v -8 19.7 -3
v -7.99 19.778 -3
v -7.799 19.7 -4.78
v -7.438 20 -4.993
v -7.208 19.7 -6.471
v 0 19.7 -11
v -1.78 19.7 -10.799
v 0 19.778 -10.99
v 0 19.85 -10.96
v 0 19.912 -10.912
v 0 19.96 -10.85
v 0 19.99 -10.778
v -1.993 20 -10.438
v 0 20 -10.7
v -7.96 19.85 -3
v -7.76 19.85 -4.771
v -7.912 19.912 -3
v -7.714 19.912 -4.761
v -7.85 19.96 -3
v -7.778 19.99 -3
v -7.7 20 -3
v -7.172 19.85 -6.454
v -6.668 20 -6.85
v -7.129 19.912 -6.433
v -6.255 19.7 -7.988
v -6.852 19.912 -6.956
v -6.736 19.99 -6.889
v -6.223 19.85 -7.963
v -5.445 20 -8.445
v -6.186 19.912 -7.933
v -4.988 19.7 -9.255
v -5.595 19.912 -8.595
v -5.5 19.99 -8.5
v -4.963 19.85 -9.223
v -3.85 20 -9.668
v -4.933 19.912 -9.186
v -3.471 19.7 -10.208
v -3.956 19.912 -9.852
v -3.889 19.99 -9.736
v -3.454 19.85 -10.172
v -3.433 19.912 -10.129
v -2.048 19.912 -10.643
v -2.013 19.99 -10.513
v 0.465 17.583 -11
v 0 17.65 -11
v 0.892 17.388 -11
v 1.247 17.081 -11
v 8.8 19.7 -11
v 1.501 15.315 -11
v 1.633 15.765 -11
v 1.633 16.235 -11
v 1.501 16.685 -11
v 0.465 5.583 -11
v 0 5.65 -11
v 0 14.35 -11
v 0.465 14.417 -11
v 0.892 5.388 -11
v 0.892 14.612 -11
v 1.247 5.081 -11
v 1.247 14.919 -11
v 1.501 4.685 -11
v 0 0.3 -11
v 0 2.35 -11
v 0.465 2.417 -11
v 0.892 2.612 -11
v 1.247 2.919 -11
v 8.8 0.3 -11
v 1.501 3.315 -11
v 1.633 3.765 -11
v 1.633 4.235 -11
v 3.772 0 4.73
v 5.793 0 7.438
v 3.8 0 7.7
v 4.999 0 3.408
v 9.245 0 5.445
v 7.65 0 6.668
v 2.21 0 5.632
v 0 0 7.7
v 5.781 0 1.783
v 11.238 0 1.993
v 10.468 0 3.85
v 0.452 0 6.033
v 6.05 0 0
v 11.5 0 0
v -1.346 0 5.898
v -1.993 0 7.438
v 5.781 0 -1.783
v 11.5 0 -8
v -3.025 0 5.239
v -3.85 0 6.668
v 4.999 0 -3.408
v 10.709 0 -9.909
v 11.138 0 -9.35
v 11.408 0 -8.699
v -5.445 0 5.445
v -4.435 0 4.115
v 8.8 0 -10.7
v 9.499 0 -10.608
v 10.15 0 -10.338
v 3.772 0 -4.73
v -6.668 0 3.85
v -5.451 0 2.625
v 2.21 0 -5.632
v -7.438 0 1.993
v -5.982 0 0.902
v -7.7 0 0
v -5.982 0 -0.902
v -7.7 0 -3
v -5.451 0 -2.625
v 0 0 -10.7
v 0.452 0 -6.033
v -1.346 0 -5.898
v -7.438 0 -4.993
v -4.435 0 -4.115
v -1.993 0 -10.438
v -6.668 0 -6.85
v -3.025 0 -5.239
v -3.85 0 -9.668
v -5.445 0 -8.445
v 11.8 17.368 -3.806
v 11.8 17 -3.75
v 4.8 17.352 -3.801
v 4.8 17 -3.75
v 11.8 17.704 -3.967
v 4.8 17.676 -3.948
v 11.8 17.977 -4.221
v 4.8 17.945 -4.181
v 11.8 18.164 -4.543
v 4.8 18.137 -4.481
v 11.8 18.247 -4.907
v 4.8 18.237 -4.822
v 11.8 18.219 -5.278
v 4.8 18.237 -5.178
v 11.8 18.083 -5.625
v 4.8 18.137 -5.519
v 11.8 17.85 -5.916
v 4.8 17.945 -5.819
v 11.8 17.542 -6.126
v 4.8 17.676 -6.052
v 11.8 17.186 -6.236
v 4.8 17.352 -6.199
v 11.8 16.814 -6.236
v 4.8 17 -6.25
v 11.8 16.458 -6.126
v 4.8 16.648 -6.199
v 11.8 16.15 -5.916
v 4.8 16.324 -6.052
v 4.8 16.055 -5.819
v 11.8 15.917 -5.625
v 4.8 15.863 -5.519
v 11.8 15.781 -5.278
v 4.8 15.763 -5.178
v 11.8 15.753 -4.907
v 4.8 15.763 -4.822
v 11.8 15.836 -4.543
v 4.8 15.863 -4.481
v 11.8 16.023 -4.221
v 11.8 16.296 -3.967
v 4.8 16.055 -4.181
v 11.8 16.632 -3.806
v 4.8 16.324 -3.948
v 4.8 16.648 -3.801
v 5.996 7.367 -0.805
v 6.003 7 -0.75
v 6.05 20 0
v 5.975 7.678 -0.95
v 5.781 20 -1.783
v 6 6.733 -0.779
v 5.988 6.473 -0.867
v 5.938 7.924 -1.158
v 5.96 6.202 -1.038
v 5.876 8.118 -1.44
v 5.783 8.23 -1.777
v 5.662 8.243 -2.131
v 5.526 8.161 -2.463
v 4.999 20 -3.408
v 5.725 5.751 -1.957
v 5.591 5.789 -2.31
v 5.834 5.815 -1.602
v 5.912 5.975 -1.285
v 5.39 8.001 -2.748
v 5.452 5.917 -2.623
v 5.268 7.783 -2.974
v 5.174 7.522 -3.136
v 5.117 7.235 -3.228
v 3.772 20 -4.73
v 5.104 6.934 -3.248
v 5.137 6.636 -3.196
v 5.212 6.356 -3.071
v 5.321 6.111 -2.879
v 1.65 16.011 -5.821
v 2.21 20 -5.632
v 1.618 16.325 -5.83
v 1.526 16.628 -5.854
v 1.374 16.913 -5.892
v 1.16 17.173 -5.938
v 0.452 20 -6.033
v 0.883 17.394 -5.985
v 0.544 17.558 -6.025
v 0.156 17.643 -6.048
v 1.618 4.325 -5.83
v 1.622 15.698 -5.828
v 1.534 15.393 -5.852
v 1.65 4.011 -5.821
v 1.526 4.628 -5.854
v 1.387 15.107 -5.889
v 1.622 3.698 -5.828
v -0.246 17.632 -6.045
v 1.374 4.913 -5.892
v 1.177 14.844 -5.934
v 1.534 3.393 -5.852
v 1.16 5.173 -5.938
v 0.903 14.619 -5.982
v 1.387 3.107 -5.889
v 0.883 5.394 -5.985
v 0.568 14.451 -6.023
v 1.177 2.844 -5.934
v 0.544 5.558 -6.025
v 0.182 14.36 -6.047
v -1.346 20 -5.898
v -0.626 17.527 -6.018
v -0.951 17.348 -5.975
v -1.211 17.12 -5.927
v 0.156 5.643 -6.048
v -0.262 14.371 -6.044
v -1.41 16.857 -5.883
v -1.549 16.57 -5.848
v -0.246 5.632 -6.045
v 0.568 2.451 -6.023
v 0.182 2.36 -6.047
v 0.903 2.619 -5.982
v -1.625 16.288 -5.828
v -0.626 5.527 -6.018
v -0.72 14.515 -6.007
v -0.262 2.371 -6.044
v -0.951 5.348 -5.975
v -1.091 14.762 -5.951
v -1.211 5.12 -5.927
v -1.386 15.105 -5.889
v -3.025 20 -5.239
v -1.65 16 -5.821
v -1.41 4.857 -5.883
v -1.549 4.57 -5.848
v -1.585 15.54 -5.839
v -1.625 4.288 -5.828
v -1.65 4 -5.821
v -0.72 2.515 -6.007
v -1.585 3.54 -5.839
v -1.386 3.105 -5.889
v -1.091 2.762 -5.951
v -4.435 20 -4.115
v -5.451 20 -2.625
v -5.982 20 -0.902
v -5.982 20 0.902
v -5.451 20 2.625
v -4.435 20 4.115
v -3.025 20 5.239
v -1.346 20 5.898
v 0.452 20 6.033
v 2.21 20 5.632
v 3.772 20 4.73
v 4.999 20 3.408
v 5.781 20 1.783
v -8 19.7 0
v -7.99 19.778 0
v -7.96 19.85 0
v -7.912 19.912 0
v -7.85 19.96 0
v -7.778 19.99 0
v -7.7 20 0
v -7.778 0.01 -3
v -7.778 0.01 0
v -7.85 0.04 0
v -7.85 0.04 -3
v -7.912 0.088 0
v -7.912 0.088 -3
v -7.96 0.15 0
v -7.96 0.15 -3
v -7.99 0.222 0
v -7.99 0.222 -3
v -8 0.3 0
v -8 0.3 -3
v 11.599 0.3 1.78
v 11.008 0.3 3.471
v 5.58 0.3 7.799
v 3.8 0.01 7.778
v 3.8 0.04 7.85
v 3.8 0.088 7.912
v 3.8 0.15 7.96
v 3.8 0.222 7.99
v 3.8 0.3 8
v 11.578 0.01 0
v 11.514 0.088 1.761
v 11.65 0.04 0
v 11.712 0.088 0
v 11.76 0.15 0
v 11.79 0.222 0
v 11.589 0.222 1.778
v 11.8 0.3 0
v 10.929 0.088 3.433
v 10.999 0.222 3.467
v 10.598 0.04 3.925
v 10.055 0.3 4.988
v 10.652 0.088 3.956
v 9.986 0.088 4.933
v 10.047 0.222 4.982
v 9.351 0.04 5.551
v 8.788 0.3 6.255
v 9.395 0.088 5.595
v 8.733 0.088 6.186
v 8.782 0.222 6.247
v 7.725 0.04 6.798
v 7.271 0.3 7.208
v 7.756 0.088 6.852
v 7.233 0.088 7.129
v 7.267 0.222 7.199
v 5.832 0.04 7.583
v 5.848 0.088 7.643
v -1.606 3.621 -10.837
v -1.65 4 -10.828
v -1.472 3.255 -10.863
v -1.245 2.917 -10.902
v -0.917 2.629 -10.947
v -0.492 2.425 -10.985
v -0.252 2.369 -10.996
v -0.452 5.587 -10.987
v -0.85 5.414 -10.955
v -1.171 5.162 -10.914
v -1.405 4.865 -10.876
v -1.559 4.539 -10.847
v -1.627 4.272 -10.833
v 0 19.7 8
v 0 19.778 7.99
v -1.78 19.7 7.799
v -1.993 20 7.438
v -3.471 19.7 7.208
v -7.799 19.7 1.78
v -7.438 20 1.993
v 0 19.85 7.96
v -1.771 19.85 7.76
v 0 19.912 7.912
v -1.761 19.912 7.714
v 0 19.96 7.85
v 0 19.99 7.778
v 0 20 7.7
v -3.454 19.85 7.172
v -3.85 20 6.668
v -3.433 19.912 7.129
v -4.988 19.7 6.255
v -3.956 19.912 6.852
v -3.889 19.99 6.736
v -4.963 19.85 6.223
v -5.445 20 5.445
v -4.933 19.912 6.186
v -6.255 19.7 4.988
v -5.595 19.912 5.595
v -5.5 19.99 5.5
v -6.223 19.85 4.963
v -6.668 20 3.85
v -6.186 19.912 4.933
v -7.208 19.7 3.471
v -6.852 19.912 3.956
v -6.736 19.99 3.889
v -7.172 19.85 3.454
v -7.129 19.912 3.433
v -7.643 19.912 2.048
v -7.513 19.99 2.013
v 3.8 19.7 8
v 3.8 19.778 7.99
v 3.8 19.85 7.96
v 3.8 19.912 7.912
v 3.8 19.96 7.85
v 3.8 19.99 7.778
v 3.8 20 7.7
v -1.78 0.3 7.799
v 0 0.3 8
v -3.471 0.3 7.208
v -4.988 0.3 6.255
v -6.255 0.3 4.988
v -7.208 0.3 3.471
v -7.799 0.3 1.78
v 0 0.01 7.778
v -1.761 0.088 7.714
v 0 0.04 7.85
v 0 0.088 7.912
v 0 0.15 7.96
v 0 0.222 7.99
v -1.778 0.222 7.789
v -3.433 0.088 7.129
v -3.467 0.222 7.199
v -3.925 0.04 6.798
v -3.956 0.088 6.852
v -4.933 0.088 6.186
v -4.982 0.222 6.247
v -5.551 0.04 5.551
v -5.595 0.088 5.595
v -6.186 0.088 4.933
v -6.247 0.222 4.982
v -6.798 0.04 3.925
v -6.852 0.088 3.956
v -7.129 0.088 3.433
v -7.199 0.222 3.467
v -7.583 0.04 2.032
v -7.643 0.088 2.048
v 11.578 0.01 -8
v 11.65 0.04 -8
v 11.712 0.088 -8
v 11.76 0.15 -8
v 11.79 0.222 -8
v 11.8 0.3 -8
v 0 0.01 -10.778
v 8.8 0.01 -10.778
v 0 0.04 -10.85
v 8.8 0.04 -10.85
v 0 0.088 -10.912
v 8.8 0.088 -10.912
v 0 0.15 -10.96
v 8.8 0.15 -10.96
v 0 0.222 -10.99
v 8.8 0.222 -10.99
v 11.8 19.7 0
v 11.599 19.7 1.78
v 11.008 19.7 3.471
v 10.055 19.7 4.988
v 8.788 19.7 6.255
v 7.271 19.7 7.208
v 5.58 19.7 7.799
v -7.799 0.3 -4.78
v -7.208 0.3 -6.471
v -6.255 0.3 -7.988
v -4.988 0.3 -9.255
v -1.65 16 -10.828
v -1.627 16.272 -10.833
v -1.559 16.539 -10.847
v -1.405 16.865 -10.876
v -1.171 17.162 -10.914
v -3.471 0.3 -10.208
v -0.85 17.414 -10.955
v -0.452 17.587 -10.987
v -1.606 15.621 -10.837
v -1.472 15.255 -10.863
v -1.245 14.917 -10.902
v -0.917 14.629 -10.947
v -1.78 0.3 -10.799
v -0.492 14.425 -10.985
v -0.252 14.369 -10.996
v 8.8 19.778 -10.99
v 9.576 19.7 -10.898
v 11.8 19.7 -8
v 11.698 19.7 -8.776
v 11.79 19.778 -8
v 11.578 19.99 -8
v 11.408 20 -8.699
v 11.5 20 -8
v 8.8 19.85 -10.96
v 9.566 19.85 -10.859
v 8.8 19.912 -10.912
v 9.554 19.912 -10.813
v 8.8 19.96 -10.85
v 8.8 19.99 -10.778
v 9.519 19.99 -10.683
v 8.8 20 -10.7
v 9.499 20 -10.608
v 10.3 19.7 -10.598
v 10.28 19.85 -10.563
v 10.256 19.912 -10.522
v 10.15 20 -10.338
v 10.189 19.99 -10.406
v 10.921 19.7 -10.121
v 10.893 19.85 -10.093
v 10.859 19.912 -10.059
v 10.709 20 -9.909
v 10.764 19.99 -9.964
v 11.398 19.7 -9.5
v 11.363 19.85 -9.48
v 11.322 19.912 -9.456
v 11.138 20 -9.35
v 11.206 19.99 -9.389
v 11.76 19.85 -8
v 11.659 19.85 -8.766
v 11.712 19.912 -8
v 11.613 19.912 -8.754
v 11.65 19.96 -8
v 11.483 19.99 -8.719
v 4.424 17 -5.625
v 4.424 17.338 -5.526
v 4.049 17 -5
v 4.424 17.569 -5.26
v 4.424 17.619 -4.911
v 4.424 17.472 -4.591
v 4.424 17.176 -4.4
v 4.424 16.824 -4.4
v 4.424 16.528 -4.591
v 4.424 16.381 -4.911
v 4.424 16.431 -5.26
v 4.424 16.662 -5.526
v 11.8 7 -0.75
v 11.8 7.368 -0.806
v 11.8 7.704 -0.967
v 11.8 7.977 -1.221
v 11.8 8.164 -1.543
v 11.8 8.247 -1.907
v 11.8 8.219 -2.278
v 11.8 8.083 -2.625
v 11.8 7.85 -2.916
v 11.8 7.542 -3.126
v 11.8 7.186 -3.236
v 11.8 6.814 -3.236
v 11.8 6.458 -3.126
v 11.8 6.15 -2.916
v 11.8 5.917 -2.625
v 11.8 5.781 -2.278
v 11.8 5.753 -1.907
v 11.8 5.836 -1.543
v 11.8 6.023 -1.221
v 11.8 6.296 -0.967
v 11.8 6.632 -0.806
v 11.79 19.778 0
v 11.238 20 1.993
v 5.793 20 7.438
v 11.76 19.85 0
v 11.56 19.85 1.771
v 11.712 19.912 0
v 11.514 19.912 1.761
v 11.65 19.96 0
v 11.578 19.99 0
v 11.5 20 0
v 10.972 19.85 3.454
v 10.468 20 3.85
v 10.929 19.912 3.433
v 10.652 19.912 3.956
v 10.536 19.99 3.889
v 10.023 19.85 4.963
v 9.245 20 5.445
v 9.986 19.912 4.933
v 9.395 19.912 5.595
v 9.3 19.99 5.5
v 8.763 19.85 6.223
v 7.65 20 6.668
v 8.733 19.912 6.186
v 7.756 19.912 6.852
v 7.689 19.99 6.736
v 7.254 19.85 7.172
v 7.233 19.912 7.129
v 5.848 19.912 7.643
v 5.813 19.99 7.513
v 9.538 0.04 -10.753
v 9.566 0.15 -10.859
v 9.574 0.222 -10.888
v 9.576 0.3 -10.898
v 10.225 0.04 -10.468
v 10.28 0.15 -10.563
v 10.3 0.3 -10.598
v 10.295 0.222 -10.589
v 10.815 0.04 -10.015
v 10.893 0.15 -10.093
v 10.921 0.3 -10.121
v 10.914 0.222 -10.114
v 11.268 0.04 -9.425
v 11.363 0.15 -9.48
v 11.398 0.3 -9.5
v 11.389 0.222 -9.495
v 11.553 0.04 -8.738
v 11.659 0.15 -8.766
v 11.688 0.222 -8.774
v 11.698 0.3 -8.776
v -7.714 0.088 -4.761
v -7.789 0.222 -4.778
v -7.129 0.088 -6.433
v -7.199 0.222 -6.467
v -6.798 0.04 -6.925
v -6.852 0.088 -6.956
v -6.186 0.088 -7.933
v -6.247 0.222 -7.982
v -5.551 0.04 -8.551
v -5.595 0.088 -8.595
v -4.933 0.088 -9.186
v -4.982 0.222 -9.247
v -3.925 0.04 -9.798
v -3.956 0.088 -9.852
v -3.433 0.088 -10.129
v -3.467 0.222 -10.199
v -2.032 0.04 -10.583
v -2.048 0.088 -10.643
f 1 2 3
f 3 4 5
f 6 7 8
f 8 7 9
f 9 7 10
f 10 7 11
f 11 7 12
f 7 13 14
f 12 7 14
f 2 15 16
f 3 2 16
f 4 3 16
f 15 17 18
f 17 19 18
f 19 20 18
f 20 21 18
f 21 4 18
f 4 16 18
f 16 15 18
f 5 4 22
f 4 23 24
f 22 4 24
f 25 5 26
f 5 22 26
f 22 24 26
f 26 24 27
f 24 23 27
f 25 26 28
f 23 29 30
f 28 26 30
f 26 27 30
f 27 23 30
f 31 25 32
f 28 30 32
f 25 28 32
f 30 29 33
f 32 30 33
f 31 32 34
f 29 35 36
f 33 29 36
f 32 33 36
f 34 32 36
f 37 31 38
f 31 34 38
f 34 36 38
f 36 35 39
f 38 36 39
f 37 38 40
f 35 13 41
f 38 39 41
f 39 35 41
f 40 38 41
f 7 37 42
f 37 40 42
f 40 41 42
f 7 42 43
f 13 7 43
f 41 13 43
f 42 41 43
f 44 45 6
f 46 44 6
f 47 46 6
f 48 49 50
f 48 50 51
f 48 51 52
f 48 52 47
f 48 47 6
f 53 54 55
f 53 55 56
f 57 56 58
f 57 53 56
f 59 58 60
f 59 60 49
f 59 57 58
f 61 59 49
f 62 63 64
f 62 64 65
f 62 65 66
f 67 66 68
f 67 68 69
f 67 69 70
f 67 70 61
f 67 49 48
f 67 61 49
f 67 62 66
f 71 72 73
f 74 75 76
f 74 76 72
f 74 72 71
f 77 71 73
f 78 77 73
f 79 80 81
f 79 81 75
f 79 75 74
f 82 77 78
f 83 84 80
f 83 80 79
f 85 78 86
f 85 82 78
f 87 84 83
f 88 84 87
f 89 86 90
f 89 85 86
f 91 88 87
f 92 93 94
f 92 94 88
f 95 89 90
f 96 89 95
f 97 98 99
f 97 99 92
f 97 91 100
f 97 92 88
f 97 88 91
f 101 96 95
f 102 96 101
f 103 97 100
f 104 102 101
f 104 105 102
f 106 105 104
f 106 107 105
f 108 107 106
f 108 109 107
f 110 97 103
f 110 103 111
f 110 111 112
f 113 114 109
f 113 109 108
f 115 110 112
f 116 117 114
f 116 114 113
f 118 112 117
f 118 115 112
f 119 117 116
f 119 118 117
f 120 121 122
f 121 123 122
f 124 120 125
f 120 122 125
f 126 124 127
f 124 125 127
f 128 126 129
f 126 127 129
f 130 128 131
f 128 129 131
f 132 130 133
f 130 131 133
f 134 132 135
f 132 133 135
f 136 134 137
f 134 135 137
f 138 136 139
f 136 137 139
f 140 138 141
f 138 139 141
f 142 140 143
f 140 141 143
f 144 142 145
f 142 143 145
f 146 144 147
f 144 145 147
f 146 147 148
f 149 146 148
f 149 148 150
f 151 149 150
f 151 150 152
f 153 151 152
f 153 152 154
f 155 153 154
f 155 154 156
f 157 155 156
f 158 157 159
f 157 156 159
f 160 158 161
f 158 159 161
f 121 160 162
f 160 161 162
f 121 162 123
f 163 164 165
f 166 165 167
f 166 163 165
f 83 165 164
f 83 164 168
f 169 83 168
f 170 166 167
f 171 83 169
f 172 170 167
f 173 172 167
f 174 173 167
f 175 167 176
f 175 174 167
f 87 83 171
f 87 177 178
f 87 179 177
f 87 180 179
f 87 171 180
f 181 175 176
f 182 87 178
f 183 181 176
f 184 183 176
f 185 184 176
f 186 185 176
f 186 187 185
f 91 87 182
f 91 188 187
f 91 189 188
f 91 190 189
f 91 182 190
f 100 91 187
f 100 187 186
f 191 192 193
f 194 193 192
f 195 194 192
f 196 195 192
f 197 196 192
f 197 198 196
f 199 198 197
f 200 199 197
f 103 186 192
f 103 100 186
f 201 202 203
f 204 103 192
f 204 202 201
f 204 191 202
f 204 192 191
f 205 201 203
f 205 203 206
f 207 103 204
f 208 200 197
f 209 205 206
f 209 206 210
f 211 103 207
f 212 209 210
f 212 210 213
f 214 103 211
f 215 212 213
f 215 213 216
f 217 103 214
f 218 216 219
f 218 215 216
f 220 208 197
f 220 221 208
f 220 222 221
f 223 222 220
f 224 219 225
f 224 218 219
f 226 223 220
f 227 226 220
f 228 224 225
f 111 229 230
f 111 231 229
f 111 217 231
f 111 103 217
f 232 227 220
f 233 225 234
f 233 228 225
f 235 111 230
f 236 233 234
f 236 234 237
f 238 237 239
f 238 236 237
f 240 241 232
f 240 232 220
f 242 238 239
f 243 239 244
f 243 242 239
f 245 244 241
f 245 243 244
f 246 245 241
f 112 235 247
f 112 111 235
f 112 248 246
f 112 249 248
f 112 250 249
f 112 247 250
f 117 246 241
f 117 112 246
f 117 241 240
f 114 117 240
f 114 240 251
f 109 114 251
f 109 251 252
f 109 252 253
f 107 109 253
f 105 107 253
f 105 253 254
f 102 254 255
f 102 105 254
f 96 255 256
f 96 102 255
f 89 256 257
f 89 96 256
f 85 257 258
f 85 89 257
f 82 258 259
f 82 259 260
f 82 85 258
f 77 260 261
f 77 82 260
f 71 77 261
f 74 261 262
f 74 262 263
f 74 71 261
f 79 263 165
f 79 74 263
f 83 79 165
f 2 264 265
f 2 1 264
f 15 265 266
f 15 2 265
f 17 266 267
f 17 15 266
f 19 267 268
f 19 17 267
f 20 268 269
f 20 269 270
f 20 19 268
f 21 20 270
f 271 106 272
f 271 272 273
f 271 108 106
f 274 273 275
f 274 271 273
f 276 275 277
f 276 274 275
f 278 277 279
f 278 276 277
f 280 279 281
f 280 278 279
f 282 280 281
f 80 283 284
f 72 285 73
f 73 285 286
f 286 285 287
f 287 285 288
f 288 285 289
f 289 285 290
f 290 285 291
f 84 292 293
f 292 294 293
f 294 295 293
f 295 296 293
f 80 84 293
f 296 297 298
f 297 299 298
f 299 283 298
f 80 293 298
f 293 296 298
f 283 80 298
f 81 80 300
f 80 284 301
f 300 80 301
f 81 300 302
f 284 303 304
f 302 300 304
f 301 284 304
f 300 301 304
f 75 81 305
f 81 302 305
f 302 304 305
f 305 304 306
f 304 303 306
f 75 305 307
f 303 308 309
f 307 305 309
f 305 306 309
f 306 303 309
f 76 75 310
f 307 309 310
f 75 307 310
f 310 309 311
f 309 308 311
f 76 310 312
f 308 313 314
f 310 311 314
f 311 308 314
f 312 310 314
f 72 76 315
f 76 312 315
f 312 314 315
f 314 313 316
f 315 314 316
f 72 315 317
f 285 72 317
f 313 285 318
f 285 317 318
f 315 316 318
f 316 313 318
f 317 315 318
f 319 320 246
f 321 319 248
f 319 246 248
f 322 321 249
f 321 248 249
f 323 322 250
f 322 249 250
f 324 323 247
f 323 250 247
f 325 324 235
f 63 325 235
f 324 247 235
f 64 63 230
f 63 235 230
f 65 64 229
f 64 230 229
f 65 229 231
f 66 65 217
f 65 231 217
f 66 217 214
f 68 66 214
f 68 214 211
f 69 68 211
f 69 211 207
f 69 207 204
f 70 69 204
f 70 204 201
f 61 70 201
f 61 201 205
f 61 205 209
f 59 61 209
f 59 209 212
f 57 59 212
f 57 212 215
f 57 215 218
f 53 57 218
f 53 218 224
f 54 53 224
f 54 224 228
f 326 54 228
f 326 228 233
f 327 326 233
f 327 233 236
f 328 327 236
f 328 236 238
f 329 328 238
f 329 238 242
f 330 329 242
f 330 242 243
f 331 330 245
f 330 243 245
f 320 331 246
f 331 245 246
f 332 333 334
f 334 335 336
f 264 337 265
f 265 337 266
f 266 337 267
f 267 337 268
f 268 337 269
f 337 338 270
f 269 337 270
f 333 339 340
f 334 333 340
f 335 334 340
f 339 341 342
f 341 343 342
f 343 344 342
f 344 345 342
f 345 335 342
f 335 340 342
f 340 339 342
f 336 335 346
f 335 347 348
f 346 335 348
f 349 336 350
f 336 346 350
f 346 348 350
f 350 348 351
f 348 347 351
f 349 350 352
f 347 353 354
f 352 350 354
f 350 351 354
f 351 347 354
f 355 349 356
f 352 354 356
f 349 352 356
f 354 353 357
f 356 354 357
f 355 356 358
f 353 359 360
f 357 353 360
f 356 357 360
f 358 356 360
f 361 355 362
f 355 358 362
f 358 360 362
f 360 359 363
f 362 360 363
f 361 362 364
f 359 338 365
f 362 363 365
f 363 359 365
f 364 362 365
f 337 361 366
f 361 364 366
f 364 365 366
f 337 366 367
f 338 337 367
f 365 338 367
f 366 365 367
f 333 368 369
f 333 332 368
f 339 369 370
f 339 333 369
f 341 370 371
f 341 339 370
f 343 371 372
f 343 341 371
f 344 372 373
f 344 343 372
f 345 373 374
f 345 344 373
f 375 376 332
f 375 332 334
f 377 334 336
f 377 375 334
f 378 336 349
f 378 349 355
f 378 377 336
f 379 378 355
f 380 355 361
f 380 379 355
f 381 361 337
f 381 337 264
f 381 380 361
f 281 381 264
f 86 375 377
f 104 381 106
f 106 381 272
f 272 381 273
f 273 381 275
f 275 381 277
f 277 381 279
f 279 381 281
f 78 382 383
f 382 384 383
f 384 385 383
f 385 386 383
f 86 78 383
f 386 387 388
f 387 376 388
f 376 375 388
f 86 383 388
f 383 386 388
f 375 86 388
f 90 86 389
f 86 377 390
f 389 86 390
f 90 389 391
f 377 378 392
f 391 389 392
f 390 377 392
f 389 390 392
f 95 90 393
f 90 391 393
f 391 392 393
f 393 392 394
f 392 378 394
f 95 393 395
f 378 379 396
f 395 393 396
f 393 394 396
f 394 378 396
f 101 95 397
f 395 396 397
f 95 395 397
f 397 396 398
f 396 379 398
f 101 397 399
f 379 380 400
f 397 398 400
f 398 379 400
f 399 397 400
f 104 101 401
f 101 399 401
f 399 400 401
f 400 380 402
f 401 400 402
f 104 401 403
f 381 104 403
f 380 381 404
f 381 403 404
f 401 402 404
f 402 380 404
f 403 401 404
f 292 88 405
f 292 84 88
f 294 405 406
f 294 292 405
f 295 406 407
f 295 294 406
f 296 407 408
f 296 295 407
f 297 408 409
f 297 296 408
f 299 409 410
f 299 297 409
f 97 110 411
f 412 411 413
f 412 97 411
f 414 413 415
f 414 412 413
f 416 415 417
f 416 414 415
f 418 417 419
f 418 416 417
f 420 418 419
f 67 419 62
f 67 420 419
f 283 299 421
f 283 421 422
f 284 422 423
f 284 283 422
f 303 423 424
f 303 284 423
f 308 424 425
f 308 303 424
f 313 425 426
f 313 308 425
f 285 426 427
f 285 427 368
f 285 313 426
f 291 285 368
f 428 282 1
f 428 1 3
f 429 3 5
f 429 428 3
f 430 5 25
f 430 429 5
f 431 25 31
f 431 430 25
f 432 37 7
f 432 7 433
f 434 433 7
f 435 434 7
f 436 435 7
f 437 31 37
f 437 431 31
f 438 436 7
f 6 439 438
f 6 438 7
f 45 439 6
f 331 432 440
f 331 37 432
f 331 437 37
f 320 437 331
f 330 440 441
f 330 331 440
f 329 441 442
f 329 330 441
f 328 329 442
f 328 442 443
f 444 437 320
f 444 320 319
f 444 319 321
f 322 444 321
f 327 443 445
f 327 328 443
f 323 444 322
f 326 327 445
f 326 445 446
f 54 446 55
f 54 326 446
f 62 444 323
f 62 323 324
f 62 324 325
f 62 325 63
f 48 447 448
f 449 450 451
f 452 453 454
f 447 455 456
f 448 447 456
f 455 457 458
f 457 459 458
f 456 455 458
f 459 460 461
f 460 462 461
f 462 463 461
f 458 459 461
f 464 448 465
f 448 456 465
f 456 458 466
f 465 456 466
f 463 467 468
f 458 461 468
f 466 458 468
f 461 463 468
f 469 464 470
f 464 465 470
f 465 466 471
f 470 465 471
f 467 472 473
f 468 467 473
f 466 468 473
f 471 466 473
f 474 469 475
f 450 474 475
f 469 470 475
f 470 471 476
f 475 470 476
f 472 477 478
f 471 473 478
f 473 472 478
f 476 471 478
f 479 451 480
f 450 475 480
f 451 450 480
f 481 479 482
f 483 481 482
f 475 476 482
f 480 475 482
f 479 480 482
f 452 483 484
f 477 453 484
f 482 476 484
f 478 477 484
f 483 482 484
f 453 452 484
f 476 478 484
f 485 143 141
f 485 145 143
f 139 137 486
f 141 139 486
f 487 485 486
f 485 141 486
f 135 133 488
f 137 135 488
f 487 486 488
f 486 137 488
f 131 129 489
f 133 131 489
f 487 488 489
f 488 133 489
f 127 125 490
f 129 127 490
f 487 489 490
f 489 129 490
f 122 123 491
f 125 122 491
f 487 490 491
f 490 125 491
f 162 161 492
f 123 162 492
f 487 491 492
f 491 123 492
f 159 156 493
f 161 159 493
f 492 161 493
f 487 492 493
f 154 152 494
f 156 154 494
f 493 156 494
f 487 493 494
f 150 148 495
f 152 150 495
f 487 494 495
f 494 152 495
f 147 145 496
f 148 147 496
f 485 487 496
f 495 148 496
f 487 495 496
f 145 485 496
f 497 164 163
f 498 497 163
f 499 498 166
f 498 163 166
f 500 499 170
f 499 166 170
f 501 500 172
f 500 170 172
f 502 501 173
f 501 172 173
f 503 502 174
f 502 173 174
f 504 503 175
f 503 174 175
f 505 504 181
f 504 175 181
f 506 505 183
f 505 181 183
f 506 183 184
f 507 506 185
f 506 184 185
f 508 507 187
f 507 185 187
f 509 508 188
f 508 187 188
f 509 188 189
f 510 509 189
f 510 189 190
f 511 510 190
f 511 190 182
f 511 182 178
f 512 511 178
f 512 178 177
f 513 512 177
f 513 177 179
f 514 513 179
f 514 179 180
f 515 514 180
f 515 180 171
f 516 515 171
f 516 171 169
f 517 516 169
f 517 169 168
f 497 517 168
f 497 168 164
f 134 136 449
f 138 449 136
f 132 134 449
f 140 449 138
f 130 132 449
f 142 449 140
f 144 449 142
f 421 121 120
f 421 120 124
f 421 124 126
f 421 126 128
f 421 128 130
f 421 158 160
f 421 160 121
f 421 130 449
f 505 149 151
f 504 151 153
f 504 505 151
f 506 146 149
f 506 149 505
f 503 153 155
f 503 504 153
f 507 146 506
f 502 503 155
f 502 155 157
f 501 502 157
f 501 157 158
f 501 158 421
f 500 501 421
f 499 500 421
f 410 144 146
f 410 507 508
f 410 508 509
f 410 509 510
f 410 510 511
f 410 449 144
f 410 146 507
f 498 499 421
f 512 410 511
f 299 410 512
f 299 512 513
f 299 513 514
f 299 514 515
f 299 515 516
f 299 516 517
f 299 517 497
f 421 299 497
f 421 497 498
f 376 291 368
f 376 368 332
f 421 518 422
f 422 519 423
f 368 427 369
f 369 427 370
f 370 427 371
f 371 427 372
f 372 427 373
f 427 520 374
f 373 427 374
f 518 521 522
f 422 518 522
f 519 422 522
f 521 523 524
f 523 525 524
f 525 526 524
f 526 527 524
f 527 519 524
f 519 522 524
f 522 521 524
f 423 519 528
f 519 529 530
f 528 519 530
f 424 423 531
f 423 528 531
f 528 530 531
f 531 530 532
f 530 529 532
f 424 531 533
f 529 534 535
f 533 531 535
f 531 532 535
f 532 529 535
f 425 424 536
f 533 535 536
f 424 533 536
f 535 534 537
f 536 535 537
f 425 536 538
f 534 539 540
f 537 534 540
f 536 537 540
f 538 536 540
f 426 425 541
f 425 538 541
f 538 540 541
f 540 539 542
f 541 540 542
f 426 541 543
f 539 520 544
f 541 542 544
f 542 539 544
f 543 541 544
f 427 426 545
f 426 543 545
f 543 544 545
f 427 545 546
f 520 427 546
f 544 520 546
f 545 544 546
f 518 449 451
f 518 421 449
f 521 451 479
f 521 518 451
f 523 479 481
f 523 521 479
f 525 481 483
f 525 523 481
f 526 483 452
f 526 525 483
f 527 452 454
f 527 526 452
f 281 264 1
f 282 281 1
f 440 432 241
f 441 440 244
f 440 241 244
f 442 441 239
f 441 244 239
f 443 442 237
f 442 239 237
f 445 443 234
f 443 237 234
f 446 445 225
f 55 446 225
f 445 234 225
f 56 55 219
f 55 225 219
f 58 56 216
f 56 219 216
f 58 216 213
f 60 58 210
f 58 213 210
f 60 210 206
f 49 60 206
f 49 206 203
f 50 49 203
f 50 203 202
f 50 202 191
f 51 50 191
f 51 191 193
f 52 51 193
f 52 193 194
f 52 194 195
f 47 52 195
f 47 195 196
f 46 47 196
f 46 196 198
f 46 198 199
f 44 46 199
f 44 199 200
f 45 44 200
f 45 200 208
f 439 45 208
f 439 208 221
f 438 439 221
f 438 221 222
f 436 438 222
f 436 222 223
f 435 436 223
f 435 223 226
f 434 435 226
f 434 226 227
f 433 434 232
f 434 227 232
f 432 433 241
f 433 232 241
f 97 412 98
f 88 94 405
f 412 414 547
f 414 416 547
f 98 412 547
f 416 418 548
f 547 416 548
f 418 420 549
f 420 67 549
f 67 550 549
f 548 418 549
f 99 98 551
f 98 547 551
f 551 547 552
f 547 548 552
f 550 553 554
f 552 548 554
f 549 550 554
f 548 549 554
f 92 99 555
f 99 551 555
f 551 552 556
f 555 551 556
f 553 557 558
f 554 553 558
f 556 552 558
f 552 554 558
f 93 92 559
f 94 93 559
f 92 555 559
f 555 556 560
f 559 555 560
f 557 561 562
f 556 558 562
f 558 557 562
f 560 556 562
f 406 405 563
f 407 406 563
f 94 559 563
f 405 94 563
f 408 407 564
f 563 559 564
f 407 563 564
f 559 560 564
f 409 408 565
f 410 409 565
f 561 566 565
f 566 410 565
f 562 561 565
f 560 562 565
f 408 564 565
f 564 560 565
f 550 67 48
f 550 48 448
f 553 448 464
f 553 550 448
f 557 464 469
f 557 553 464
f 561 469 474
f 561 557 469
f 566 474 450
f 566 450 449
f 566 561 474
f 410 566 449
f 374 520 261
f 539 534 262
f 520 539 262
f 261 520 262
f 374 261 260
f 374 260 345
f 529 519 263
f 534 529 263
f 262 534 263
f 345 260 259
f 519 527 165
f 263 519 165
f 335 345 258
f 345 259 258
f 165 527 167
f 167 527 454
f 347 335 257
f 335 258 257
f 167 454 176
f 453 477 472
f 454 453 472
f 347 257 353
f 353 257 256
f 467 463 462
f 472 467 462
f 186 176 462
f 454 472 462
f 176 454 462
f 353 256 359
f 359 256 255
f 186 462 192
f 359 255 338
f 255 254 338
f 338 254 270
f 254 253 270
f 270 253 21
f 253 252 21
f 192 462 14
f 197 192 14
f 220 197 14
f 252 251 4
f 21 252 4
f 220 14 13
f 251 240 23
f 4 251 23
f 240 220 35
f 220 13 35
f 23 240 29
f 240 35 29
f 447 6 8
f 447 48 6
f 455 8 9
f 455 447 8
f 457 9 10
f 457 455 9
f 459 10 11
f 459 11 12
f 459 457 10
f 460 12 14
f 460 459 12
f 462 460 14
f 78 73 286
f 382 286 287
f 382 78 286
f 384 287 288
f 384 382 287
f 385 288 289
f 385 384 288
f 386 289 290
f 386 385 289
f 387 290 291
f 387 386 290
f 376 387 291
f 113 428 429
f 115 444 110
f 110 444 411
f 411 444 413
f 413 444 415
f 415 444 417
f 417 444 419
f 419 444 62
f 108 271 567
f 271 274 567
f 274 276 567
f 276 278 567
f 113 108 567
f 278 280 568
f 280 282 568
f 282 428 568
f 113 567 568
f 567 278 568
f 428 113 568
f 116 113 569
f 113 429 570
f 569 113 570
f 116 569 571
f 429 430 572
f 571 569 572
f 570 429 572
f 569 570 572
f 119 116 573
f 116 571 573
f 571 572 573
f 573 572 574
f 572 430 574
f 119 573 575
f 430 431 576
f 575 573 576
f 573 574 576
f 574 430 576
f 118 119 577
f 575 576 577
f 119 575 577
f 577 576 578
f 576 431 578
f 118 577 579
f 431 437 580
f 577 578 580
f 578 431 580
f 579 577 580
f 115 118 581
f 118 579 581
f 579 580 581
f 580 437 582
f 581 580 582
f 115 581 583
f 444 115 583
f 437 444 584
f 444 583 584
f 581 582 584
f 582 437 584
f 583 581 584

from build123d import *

# Parameters (mm, degrees)
SKETCH_1_R             = 6.05
EXTRUDE_1_DEPTH        = 20
SKETCH_2_R             = 1
CUT_EXTRUDE_1_DEPTH    = 2
HOLE_WIZARD_M3_1_D     = 2.5
HOLE_WIZARD_M3_1_DEPTH = 7
HOLE_WIZARD_M3_1_TIP   = 0.751075774
HOLE_WIZARD_M4_1_D     = 3.3
HOLE_WIZARD_M4_1_DEPTH = 11.5
HOLE_WIZARD_M4_1_TIP   = 0.991420021
FILLET_1_R             = 0.3


with BuildPart() as part:
    # 草图1 → 凸台-拉伸1 (new body)
    with BuildSketch(Plane(origin=(0, 0, 0), x_dir=(1, 0, 0), z_dir=(0, 1, 0))):
        with BuildLine():
            Line((0, 11), (8.8, 11))
            ThreePointArc((8.8, 11), (10.921320344, 10.121320344), (11.8, 8))
            Line((11.8, 8), (11.8, 0))
            ThreePointArc((11.8, 0), (9.456854249, -5.656854249), (3.8, -8))
            Line((3.8, -8), (0, -8))
            ThreePointArc((0, -8), (-5.656854249, -5.656854249), (-8, 0))
            Line((-8, 0), (-8, 3))
            ThreePointArc((-8, 3), (-5.656854249, 8.656854249), (0, 11))
        make_face()
        Circle(SKETCH_1_R, mode=Mode.SUBTRACT)
    extrude(amount=EXTRUDE_1_DEPTH)

    # 草图2 → 切除-拉伸1 (cut)
    with BuildSketch(Plane(origin=(11.8, 0, 0), x_dir=(0, 0, -1), z_dir=(1, 0, 0))):
        with Locations((5, 17)):
            Circle(SKETCH_2_R)
        with Locations((2, 7)):
            Circle(SKETCH_2_R)
    extrude(amount=-CUT_EXTRUDE_1_DEPTH, mode=Mode.SUBTRACT)

    # M3 螺纹孔1
    with Locations(Plane(origin=(11.8, 0, 0), x_dir=(0, 0, -1), z_dir=(1, 0, 0))):
        with Locations((5, 17), (2, 7)):
            Hole(HOLE_WIZARD_M3_1_D / 2, depth=HOLE_WIZARD_M3_1_DEPTH)
            with Locations((0, 0, -(HOLE_WIZARD_M3_1_DEPTH + HOLE_WIZARD_M3_1_TIP / 2))):  # 118° drill point
                Cone(0, HOLE_WIZARD_M3_1_D / 2, HOLE_WIZARD_M3_1_TIP, mode=Mode.SUBTRACT)

    # M4 螺纹孔1
    with Locations(Plane(origin=(3, 0, -11), x_dir=(1, 0, 0), z_dir=(0, 0, -1))):
        with Locations((-3, -16), (-3, -4)):
            Hole(HOLE_WIZARD_M4_1_D / 2, depth=HOLE_WIZARD_M4_1_DEPTH)
            with Locations((0, 0, -(HOLE_WIZARD_M4_1_DEPTH + HOLE_WIZARD_M4_1_TIP / 2))):  # 118° drill point
                Cone(0, HOLE_WIZARD_M4_1_D / 2, HOLE_WIZARD_M4_1_TIP, mode=Mode.SUBTRACT)

    # 圆角1
    fillet_1_edges = [part.edges().sort_by_distance(p)[0] for p in [
        (10.921320344, 20, -10.121320344),
        (11.8, 0, -4),
        (9.456854249, 0, 5.656854249),
        (4.4, 20, -11),
        (-5.656854249, 20, -8.656854249),
        (-8, 20, -1.5),
        (-5.656854249, 20, 5.656854249),
        (1.9, 20, 8),
        (9.456854249, 20, 5.656854249),
        (11.8, 20, -4),
        (1.9, 0, 8),
        (-5.656854249, 0, 5.656854249),
        (-8, 0, -1.5),
        (-5.656854249, 0, -8.656854249),
        (4.4, 0, -11),
        (10.921320344, 0, -10.121320344),
    ]]
    fillet(fillet_1_edges, radius=FILLET_1_R)


solid = part.part
